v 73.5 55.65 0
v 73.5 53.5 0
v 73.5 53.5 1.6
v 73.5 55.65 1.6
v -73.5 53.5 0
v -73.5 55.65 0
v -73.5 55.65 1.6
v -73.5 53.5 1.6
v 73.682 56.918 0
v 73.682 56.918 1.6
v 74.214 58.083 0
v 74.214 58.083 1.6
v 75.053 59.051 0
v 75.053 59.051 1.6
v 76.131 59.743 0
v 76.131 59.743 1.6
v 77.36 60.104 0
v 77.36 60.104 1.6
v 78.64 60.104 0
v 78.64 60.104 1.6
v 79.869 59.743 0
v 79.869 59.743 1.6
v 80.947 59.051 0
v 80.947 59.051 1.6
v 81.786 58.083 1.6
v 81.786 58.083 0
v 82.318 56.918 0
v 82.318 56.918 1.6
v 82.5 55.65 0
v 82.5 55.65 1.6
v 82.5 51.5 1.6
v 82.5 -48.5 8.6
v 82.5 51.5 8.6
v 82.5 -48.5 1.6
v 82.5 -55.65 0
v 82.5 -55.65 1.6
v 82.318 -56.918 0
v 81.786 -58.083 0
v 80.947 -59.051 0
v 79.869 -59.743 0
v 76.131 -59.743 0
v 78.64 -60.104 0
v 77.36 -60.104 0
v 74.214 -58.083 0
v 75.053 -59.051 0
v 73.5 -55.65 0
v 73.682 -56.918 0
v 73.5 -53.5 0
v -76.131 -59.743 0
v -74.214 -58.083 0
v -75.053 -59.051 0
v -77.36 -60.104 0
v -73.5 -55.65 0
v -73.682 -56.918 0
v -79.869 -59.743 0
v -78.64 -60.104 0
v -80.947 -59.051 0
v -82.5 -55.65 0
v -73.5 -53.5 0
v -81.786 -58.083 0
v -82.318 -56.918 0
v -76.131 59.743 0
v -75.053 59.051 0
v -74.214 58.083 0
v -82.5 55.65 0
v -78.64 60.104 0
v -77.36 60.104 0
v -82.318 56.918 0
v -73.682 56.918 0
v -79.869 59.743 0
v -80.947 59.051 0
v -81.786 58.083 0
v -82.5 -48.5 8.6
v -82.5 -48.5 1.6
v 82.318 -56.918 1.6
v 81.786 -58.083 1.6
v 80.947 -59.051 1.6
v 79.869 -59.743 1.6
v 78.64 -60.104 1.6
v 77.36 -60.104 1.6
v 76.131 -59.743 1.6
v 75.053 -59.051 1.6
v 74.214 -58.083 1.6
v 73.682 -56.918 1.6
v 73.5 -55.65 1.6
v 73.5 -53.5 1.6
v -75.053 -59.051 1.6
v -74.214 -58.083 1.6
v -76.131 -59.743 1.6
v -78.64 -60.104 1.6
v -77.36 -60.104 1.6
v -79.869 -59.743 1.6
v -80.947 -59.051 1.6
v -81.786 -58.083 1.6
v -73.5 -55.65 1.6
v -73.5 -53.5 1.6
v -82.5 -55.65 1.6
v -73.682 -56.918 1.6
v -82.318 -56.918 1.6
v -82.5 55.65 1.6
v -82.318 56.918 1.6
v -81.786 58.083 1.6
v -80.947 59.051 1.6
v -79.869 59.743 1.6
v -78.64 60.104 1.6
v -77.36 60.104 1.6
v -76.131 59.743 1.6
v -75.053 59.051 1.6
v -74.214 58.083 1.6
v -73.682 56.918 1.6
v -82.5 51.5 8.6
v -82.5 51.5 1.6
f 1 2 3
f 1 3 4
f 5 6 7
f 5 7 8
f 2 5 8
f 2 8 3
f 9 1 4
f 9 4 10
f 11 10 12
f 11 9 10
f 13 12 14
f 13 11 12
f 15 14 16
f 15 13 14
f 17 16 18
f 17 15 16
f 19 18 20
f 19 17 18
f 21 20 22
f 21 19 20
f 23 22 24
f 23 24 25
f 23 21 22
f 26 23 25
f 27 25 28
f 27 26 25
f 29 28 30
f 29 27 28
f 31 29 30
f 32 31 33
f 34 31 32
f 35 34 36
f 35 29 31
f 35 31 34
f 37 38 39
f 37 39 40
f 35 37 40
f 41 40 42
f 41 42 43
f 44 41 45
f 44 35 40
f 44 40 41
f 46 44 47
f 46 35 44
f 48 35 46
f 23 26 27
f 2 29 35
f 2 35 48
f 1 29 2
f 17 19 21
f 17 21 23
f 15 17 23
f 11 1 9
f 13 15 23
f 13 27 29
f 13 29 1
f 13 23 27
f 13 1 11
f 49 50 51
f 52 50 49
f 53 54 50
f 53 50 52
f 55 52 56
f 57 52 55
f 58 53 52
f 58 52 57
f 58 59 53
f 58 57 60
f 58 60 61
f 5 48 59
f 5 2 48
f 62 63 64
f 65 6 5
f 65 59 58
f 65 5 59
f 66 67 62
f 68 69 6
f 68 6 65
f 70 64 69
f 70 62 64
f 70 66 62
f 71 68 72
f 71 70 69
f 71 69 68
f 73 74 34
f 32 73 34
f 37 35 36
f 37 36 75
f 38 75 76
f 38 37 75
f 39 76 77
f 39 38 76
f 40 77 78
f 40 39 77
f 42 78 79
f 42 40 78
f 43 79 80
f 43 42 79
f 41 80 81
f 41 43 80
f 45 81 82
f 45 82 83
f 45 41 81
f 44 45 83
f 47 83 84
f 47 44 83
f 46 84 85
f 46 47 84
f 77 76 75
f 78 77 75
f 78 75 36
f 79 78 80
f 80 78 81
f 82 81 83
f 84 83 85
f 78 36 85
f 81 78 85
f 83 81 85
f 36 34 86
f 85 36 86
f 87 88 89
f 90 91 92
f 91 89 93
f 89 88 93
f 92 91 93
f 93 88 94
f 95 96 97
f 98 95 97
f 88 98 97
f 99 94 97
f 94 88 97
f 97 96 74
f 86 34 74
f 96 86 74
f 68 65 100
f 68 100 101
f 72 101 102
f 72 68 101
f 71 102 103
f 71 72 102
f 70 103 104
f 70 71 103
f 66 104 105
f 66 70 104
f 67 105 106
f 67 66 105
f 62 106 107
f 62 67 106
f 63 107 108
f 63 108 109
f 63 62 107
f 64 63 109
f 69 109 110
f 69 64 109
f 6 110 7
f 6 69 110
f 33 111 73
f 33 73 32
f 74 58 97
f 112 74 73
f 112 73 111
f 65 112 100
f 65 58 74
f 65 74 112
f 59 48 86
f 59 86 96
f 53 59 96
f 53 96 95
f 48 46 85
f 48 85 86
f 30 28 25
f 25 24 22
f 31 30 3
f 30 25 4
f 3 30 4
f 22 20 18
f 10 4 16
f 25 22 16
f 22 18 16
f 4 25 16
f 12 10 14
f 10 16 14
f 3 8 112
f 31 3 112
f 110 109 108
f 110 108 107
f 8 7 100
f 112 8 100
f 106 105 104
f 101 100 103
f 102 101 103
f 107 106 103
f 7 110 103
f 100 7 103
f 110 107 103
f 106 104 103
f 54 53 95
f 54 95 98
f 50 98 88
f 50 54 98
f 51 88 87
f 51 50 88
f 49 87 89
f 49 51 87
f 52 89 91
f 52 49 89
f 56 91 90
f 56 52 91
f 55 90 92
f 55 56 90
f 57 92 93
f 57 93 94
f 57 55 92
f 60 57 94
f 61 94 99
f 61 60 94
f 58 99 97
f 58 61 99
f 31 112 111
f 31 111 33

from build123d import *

# Parameters (mm, degrees)
BOSS_EXTRU_1_DEPTH = 1.6
ESQUISSE2_W        = 165
ESQUISSE2_H        = 100
BOSS_EXTRU_2_DEPTH = 7


with BuildPart() as part:
    # Esquisse1 → Boss.-Extru.1 (new body)
    with BuildSketch(Plane.XY):
        with BuildLine():
            Line((-82.5, 53.5), (-82.5, 55.65))
            ThreePointArc((-82.5, 55.65), (-78, 60.15), (-73.5, 55.65))
            Line((-73.5, 55.65), (-73.5, 53.5))
            Line((-73.5, 53.5), (73.5, 53.5))
            Line((73.5, 53.5), (73.5, 55.65))
            ThreePointArc((73.5, 55.65), (78, 60.15), (82.5, 55.65))
            Line((82.5, 55.65), (82.5, 53.5))
            Line((82.5, 53.5), (82.5, -53.5))
            Line((82.5, -53.5), (82.5, -55.65))
            ThreePointArc((82.5, -55.65), (78, -60.15), (73.5, -55.65))
            Line((73.5, -55.65), (73.5, -53.5))
            Line((73.5, -53.5), (-73.5, -53.5))
            Line((-73.5, -53.5), (-73.5, -55.65))
            ThreePointArc((-73.5, -55.65), (-78, -60.15), (-82.5, -55.65))
            Line((-82.5, -55.65), (-82.5, -53.5))
            Line((-82.5, -53.5), (-82.5, 53.5))
        make_face()
    extrude(amount=BOSS_EXTRU_1_DEPTH)

    # Esquisse2 → Boss.-Extru.2 (add)
    with BuildSketch(Plane.XY.offset(1.6)):
        with Locations((0, 1.5)):
            Rectangle(ESQUISSE2_W, ESQUISSE2_H)
    extrude(amount=BOSS_EXTRU_2_DEPTH)


solid = part.part
